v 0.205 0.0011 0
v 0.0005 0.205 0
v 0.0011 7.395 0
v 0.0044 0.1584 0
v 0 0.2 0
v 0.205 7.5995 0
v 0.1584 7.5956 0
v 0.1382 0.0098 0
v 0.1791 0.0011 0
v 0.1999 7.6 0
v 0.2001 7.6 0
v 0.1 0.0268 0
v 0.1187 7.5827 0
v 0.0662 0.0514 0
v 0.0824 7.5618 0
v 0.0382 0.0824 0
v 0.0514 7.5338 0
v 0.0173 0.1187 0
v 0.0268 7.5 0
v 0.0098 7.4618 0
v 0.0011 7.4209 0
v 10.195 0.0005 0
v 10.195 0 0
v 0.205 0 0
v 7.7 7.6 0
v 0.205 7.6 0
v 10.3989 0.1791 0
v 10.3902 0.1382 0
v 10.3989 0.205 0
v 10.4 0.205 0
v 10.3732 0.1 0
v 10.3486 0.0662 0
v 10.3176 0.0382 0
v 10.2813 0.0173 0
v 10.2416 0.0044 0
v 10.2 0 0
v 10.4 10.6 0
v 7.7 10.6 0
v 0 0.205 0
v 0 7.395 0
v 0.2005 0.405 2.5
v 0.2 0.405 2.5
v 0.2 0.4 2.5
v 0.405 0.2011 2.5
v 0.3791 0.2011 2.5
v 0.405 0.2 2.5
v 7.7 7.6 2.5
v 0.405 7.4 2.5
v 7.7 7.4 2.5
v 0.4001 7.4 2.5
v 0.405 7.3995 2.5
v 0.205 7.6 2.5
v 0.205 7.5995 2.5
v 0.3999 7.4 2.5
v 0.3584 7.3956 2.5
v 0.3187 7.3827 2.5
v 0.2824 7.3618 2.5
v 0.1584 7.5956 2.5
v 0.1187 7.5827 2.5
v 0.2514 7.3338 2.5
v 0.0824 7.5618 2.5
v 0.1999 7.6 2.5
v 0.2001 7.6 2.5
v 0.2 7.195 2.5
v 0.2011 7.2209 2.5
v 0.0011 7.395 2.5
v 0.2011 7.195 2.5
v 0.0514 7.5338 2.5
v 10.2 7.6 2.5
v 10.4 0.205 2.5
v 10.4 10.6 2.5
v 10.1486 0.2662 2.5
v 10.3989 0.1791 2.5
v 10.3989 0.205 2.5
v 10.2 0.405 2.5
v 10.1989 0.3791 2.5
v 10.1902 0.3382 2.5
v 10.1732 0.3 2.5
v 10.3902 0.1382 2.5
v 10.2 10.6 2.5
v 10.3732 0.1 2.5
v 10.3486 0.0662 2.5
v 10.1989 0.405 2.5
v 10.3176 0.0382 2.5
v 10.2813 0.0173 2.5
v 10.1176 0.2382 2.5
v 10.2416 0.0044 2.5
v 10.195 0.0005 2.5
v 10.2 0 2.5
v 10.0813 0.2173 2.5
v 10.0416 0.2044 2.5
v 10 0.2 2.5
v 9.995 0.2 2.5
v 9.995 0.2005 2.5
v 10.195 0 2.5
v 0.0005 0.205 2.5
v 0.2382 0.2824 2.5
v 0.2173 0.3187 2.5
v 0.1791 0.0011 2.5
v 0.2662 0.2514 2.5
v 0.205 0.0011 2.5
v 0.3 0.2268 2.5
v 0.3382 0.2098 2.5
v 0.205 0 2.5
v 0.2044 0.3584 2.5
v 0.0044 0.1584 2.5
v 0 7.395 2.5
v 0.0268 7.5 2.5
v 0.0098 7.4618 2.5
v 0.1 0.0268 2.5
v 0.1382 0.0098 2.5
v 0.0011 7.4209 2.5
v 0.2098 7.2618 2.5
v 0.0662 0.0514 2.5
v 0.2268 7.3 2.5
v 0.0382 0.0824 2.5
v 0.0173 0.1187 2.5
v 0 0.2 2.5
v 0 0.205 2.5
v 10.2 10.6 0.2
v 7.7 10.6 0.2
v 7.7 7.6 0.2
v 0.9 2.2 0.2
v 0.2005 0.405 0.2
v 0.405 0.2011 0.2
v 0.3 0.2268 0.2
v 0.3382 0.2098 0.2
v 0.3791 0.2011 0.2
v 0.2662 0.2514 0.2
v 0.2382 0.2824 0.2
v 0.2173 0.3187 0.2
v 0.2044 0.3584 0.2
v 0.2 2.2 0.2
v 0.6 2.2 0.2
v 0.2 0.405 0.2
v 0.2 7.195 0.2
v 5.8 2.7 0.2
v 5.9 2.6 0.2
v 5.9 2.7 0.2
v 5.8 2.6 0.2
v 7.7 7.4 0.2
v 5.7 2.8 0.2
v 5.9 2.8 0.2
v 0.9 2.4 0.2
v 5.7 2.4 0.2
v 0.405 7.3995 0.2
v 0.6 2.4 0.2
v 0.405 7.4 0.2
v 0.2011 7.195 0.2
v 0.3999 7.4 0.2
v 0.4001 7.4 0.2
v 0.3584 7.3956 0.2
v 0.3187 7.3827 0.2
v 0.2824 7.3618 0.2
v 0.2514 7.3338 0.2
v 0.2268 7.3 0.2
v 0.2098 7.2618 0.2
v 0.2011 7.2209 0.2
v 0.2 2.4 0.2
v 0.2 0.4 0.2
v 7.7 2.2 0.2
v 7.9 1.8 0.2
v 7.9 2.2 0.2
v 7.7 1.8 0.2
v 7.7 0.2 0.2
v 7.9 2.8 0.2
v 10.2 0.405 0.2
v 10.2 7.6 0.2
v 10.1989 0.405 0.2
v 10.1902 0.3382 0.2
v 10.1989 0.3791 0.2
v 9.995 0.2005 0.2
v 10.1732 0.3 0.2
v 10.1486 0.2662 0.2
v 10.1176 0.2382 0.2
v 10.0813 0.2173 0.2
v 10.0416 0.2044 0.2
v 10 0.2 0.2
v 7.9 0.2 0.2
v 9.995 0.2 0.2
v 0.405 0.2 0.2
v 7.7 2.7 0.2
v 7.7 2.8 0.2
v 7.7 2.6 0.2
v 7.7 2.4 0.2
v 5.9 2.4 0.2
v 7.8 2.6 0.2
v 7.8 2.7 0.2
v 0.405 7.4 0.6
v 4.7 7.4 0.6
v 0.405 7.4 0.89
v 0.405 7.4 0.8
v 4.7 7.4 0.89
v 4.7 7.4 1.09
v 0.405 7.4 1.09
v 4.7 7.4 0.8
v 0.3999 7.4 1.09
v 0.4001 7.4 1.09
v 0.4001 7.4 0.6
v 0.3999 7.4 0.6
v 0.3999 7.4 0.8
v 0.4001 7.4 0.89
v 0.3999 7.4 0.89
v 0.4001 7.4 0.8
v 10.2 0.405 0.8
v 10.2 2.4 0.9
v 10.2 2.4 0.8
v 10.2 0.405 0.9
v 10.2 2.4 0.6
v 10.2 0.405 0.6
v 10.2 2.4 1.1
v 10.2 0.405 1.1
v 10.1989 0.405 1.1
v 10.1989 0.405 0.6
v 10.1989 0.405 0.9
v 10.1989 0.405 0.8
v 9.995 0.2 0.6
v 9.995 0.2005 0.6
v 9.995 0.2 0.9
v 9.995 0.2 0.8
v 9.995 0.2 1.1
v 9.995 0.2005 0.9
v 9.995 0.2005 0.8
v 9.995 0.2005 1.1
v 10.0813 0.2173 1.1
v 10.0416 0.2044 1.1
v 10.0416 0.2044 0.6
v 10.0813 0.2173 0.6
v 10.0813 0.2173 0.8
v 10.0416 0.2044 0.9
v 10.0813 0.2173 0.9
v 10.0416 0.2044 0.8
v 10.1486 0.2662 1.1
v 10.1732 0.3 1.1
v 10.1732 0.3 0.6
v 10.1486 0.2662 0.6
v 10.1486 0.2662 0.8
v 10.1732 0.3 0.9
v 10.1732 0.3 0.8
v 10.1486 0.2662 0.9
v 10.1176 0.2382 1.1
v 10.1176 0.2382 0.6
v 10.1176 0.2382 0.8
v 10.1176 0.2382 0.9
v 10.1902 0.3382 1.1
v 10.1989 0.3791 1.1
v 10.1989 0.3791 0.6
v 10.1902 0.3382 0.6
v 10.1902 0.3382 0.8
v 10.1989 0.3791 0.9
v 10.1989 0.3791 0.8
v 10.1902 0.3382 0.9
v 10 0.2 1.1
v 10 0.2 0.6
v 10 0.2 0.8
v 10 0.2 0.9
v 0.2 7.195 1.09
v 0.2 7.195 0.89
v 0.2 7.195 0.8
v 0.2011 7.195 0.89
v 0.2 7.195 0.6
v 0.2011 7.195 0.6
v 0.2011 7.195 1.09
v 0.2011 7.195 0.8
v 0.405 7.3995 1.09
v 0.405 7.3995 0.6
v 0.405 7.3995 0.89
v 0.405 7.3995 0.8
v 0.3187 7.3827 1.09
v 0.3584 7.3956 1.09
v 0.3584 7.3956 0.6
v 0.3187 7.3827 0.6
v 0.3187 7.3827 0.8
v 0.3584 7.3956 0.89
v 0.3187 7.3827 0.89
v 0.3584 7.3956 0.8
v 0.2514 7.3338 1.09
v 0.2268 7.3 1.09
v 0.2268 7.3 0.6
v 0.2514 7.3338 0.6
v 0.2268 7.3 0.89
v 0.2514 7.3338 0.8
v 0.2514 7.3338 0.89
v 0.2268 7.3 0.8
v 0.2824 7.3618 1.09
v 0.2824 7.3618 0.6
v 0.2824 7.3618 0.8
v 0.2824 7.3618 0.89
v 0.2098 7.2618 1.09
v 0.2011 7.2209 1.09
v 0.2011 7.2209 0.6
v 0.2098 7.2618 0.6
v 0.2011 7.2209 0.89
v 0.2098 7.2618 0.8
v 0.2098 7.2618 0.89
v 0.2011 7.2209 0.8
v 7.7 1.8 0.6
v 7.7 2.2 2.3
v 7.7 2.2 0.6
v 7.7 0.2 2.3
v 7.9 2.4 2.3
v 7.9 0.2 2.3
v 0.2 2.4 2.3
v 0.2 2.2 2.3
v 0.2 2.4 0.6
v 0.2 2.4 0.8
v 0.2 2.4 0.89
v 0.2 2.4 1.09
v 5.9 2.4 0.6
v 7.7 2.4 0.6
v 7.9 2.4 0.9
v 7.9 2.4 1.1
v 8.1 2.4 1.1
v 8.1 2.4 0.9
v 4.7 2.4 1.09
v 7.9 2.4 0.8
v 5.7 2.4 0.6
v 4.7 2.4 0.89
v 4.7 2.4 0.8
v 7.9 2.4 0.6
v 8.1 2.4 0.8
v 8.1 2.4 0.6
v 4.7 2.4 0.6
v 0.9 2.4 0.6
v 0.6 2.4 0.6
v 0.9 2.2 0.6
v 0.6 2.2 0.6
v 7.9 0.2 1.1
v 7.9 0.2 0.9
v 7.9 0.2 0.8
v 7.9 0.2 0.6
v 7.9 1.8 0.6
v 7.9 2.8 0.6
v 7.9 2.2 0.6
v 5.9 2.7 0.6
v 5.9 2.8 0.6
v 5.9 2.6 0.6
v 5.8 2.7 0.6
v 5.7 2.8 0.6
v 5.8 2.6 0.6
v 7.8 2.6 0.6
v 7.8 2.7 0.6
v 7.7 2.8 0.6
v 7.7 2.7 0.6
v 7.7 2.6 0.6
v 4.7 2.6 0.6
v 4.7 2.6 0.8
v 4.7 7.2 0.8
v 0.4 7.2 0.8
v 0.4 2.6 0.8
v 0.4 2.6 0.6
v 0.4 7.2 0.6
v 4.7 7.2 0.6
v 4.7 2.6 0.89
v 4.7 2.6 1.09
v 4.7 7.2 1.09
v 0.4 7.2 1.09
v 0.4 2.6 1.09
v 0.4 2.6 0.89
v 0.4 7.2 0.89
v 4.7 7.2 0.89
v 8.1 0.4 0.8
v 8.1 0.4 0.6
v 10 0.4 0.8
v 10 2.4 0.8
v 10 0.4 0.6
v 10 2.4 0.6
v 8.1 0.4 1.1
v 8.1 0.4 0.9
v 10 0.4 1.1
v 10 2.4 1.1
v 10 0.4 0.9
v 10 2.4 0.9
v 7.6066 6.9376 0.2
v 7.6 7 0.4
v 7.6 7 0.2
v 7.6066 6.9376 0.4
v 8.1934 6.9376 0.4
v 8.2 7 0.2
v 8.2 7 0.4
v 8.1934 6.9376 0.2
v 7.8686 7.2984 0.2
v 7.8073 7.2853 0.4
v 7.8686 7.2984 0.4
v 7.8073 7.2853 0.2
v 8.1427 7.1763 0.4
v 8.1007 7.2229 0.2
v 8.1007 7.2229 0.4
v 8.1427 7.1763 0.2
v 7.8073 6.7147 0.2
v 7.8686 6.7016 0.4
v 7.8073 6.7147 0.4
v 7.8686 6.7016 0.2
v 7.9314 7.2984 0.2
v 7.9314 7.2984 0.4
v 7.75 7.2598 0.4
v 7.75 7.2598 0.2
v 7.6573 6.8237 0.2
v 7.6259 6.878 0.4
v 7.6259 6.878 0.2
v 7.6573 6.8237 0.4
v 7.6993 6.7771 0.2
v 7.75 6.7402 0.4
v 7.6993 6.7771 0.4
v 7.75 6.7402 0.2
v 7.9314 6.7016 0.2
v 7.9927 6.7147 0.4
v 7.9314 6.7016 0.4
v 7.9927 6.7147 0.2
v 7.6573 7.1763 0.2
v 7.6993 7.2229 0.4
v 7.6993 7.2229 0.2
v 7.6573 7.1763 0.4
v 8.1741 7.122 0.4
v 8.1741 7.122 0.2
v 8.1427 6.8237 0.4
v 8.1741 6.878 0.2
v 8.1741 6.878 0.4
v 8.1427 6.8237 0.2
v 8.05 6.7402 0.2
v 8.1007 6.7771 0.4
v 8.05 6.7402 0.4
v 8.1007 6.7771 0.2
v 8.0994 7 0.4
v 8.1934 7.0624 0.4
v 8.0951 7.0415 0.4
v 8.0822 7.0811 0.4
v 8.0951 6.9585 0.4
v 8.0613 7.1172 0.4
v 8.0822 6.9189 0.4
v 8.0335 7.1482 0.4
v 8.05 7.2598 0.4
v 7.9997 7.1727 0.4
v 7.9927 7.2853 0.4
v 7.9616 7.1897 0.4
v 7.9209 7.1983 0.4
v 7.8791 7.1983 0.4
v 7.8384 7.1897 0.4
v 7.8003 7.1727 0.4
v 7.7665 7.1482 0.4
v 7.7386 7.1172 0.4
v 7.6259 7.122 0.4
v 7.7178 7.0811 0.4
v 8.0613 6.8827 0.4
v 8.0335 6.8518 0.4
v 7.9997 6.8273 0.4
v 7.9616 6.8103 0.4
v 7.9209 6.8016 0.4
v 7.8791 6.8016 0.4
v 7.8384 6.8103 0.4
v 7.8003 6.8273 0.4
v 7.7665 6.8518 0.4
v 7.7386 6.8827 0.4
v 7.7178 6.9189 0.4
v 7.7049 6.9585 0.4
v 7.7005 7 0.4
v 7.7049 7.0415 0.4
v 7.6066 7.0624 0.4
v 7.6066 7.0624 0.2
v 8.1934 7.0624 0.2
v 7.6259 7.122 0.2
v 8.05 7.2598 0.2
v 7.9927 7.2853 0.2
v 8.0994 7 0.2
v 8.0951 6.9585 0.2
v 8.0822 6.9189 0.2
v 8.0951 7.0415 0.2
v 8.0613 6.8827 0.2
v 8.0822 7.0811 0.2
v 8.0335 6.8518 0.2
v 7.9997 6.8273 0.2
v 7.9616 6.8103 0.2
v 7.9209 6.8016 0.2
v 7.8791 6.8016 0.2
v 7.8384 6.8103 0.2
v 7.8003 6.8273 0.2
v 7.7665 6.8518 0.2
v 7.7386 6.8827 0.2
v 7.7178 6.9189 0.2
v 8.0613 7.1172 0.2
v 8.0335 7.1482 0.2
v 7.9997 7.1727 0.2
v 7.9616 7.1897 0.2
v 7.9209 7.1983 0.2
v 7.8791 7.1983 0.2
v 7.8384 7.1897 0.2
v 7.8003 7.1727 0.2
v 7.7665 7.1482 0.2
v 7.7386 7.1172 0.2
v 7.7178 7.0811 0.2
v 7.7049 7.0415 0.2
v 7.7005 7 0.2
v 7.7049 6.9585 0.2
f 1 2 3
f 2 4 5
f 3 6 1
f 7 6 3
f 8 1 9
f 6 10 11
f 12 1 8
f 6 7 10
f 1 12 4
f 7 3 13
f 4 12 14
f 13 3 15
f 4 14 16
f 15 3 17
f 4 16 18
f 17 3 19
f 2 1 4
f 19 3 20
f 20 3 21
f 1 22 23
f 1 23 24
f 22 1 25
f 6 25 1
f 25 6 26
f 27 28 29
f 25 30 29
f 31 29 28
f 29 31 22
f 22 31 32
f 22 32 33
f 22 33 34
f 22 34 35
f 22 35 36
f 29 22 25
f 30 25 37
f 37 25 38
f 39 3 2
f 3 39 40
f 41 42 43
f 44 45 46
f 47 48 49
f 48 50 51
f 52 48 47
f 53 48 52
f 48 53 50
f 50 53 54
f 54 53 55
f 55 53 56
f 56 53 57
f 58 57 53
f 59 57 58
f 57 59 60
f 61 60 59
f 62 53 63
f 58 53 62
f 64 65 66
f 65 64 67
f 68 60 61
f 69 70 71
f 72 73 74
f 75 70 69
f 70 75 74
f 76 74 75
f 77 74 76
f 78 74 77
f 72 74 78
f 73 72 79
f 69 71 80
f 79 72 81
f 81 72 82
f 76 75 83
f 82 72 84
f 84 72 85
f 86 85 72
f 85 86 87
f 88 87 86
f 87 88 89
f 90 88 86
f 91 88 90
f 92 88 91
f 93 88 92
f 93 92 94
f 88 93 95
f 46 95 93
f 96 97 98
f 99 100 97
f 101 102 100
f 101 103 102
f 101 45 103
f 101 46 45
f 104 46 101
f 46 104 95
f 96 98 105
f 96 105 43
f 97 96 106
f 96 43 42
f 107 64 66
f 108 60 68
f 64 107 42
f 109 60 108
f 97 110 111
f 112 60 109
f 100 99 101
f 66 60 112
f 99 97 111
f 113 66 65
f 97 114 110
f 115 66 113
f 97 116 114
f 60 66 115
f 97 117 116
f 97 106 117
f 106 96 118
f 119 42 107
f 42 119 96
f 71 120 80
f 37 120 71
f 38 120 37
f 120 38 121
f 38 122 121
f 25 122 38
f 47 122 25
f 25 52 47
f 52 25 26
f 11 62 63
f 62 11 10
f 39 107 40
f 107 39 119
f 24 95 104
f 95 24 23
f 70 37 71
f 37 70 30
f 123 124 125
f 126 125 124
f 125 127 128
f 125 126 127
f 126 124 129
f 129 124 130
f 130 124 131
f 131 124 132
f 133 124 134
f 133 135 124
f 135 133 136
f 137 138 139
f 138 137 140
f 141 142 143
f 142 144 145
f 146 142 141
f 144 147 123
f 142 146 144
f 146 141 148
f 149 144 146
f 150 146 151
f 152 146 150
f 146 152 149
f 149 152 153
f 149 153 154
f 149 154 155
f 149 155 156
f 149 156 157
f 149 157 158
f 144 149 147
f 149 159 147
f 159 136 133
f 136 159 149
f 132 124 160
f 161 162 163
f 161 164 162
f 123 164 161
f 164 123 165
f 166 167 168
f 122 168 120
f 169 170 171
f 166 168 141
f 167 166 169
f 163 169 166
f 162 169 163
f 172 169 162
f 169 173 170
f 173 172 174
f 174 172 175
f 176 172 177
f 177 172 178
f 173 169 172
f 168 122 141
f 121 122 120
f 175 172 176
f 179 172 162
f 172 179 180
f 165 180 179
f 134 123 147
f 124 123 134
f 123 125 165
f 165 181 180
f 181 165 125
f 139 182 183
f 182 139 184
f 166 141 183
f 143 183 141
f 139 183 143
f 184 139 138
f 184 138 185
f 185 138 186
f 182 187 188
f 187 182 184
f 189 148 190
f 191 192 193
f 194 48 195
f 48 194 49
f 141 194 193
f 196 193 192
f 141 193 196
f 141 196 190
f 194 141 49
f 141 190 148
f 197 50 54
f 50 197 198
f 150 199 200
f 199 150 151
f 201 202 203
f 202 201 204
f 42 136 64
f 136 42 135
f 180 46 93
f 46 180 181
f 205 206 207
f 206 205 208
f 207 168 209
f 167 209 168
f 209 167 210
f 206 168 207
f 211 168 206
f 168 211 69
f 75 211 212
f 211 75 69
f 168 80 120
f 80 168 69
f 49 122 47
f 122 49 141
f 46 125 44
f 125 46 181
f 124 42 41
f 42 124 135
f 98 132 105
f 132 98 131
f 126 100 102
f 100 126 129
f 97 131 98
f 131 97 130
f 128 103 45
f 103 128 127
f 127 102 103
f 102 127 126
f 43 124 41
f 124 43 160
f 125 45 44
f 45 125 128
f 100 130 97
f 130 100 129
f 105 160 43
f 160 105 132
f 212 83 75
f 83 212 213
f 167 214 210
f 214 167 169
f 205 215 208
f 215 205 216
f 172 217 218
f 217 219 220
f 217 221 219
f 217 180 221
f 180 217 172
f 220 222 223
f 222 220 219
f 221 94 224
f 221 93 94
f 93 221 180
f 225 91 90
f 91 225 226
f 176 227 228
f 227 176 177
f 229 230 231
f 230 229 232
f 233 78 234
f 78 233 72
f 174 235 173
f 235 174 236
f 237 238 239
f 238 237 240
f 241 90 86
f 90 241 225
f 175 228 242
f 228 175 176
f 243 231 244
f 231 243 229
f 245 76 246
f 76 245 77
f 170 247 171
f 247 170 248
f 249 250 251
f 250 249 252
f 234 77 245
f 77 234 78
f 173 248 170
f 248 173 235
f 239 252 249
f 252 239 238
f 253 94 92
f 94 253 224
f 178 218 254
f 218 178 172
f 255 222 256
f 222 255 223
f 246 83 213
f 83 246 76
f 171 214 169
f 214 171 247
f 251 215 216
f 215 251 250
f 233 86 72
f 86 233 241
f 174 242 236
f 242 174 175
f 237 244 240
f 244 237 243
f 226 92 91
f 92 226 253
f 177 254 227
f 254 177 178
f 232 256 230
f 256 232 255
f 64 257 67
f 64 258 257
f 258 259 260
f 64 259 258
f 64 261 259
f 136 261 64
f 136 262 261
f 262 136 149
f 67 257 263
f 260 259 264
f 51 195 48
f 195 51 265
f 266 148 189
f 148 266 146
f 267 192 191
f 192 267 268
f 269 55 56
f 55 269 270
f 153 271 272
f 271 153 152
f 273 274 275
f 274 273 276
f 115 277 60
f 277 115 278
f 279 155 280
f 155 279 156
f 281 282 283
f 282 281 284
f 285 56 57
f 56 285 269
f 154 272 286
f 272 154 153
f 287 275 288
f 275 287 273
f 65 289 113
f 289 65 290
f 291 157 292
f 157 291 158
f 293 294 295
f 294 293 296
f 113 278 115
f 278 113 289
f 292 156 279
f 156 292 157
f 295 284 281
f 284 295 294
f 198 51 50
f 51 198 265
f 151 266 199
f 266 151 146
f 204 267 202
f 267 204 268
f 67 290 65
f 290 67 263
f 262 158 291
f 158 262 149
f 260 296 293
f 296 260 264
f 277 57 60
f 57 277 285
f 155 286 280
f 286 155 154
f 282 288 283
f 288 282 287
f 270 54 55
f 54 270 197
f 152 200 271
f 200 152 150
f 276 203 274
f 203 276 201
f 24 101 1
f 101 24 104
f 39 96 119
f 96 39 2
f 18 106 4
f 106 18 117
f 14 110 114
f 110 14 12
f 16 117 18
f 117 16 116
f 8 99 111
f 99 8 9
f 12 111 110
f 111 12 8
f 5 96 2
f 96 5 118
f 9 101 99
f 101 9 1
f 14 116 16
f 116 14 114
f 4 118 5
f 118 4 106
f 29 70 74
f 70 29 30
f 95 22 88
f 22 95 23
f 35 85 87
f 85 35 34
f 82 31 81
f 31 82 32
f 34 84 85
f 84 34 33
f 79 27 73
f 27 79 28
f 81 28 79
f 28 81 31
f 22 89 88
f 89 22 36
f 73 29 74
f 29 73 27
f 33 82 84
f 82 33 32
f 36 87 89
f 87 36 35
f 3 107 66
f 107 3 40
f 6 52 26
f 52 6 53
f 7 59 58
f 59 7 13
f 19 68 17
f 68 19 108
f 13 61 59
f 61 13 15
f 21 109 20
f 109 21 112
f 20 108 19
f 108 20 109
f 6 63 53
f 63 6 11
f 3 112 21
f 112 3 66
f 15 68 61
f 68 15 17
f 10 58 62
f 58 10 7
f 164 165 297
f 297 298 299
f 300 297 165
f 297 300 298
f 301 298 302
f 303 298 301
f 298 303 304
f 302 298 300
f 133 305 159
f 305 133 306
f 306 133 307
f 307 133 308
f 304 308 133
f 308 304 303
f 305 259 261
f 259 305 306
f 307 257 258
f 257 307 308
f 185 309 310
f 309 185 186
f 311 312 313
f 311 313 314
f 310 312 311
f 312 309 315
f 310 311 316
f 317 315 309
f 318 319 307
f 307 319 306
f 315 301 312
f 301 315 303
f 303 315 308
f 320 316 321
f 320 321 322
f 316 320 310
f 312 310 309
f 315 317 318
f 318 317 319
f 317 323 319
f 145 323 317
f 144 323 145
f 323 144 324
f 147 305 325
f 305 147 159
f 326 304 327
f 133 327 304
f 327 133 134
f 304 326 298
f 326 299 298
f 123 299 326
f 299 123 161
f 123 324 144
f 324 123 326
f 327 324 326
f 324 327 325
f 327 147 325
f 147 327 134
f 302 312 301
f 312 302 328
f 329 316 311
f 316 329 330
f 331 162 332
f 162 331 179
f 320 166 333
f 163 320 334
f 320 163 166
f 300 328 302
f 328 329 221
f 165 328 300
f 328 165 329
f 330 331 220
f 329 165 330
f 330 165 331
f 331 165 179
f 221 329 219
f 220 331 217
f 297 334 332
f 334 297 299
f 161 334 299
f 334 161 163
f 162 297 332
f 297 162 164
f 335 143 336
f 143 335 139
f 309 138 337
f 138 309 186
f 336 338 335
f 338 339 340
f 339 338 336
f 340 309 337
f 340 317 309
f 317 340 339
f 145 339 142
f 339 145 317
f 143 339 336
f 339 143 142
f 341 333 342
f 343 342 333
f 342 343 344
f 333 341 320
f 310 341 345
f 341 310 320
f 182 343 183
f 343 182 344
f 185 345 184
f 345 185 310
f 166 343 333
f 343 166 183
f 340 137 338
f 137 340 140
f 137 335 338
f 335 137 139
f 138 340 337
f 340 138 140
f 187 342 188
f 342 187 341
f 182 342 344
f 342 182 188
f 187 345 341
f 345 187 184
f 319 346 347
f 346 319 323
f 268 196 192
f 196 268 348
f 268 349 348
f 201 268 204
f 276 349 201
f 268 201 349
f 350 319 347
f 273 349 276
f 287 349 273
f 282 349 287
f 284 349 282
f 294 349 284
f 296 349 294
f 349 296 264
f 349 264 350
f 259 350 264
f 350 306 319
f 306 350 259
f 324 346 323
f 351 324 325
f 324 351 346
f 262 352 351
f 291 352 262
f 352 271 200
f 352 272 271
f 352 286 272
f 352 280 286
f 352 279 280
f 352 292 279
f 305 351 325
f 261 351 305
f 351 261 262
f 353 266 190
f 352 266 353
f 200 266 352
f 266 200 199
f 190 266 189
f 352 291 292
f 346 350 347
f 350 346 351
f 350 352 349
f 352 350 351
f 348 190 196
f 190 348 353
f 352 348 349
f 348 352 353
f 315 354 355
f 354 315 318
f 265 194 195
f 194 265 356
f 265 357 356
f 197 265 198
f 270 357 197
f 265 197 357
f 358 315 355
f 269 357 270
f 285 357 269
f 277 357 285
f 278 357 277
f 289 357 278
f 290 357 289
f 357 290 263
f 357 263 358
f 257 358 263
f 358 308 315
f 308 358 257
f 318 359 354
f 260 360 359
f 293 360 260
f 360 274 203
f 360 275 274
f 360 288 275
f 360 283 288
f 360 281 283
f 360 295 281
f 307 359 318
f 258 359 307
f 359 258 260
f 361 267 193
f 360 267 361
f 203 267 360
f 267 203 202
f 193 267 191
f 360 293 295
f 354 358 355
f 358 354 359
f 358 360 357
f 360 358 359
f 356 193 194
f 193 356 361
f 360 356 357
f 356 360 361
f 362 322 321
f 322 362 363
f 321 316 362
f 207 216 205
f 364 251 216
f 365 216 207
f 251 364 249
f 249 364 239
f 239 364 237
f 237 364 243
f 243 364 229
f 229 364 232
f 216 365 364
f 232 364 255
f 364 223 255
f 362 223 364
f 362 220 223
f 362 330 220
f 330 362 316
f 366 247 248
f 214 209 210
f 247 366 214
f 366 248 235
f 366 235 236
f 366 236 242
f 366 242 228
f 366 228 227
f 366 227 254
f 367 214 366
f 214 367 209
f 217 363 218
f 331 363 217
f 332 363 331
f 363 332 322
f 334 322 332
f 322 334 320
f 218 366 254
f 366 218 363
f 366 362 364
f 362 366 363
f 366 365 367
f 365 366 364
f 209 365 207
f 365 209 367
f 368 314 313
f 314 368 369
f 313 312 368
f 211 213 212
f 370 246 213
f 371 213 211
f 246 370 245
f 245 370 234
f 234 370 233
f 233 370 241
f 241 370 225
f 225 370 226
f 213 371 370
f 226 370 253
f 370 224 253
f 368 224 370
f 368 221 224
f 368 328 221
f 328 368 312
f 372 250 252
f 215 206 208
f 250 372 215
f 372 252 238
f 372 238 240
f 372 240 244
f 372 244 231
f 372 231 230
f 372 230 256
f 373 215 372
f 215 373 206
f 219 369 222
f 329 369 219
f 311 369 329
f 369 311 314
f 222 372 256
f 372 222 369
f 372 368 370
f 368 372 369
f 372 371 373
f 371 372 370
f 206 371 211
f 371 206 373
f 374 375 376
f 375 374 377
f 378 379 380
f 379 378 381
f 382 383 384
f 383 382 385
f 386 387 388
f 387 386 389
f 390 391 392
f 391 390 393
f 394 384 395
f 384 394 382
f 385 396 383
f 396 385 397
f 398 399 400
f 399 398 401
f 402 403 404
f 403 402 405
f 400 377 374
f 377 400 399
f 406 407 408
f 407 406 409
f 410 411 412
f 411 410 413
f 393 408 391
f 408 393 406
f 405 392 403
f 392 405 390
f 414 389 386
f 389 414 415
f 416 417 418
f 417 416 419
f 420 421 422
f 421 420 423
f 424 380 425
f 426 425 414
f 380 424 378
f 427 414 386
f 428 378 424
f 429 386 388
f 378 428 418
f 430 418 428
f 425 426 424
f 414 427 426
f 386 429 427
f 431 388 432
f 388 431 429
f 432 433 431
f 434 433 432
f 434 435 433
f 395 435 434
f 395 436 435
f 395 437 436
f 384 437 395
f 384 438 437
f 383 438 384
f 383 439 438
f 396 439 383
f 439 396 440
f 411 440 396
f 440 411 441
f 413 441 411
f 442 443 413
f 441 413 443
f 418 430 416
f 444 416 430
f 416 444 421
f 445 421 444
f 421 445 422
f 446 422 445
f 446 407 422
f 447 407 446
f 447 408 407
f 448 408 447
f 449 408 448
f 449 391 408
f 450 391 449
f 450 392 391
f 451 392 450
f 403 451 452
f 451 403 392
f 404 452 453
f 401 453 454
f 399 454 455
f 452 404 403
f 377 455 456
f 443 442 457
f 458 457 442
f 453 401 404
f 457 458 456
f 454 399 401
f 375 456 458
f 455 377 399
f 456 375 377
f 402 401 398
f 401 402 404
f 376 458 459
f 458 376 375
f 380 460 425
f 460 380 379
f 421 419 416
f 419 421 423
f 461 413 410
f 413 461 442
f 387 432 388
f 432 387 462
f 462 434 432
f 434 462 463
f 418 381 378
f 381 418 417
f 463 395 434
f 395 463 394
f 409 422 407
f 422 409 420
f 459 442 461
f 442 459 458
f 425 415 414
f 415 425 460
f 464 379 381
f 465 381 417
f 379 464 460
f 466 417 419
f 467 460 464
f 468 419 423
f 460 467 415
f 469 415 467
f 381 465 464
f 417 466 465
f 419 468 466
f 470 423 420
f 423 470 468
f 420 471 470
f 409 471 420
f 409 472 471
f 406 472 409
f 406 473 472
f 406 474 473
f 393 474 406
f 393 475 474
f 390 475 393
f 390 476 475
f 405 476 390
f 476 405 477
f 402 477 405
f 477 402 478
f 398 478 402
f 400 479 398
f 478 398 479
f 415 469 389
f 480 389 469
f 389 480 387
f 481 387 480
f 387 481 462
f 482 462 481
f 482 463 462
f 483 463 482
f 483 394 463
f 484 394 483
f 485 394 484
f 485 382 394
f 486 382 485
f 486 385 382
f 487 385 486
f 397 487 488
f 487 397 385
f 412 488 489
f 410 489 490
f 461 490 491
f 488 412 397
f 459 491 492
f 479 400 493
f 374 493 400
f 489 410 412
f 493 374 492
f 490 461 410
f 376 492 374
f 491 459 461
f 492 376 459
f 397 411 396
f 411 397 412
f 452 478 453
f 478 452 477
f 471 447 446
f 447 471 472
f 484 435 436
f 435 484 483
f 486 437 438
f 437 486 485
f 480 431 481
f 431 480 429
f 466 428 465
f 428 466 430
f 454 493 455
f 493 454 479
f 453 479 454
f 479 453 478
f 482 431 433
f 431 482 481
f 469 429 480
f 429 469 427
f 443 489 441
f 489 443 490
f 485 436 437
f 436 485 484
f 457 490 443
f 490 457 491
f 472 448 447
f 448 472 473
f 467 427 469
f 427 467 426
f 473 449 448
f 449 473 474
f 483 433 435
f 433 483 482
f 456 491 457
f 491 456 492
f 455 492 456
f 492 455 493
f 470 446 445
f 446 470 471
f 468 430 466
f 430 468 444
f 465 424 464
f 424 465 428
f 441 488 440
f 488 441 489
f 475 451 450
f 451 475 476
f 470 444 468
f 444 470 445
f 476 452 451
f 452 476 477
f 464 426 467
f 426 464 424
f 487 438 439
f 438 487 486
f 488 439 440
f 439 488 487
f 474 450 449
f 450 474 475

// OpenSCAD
$fn = 30;
differenceOffset = 0.01;
resinThickness = 0.2;
casingDepth = 3;
backWallCasingDepth = 2.5;
frontWallCasingDepth = casingDepth - backWallCasingDepth;
lockHeigth = 0.2;
railsForCircuitHeigth = 0.4;
railWidth = 0.2;

doubleSidedTapeThickness = 0.1;
module handle(width, depth, heigth, thickness){
    difference(){
        cube([width, depth + thickness, heigth]);
        translate([-differenceOffset / 2, -differenceOffset, - differenceOffset])cube([width + differenceOffset, depth + differenceOffset, heigth - thickness + differenceOffset]);
        }
        screwMountToDoor = 1;
    translate([0, 0, heigth - screwMountToDoor]){
        cube([width, thickness, screwMountToDoor]);
        }
    }

module slider (width, depth, heigth, thickness, sliderExceedanceWidth){
    sliderTabWidth = 3.1;
    sliderTabHeigth = 1.8;
    translate([(sin(360 * $t) * sliderExceedanceWidth/2 ) - sliderExceedanceWidth/2, 0, 0])
    union(){
    translate([0, depth - thickness, 0]){
        cube([width + sliderExceedanceWidth, thickness, heigth]);
        }
    translate([width - sliderTabWidth - sliderExceedanceWidth/2, depth - thickness, -sliderTabHeigth]){
        cube([sliderTabWidth, thickness, sliderTabHeigth]);
        }
    }
    }   
    
module lock(width, depth, heigth, thickness){
    
    sliderThickness = 0.3;
    sliderExceedanceWidth = 1.9;
    sliderHeigth = 2.5;
    
    handle(width, depth, heigth, thickness);
    
    color("cyan")slider(width, depth,sliderHeigth, sliderThickness, sliderExceedanceWidth);
    }
    
module casingBase(){ 
        polygon([
        [0,0],
        [10 + (resinThickness * 2), 0],
        [10 + (resinThickness * 2), 10.2 + (resinThickness * 2)],
        [7.5 + (resinThickness), 10.2 + (resinThickness * 2)],
        [7.5 + (resinThickness), 7 + (resinThickness * 3)],
        [0, 7 + (resinThickness * 3)]
        ]);
        }
module backWallCasing(depth){
    module notRoundedShape (){
        difference(){
            linear_extrude(depth){
                casingBase();
                }
            translate([0, 0, resinThickness]){
                linear_extrude(depth){
                    offset(-resinThickness){
                    casingBase();
                        }   
                    }
                }
            translate([0, 7 + (resinThickness * 3), resinThickness]){
                cube([10.2, 3 + resinThickness + differenceOffset, depth]);
                }
            translate([7.5 + (resinThickness), 7 + (resinThickness * 2), resinThickness]){
                cube([resinThickness + differenceOffset, resinThickness + differenceOffset, depth]);
                }
            }
        }
    module innerRoundedShape (){
        union(){
        notRoundedShape();
        translate([resinThickness, resinThickness, 0])fillet(resinThickness, depth);
        translate([10.2, resinThickness, 0])rotate([0, 0, 90])fillet(resinThickness, depth);
        translate([resinThickness, 7 + (resinThickness * 2), 0])rotate([0, 0, 270])fillet(resinThickness, depth);
            }
        }
     module fullyRoundedShaped (){
        difference(){
        innerRoundedShape();
        translate([0, 0, - differenceOffset/2])fillet(resinThickness, depth + differenceOffset);
        translate([10.4, 0, - differenceOffset/2])rotate([0, 0, 90])fillet(resinThickness, depth + differenceOffset);
        translate([0, 7 + (resinThickness * 3), - differenceOffset/2])rotate([0, 0, 270])fillet(resinThickness, depth + differenceOffset);
            }
        }
     module addBatteryHolder (){
         union(){
             fullyRoundedShaped();
             difference(){
                 translate([resinThickness, 2 + resinThickness, resinThickness]){
                    cube([7.5, resinThickness, depth - (resinThickness * 2)]);
                    }
                 translate([resinThickness + 0.4, 2 + resinThickness, resinThickness]){
                    cube([0.3, resinThickness, railsForCircuitHeigth]);
                    }
                 }
             difference(){
                translate([7.5 + resinThickness, resinThickness, resinThickness]){
                    cube([resinThickness, 2 + resinThickness, depth - (resinThickness * 2)]);
                    }
                translate([7.5 + resinThickness, 2 + resinThickness - 0.4, resinThickness]){
                    cube([resinThickness, 0.4, railsForCircuitHeigth]);
                    }
                }
             
             
             railsForProtectionCircuit();
             }
         }
     module addRailsForCircuitBoard(){
         union(){
             addBatteryHolder();
             lowerRailForBoard();
             upperRailForBoard();
             lowerRailForScreen();
             upperRailForScreen();
             }
         }
     module lowerRailForBoard(){
         union(){
            translate([resinThickness, 2 + (resinThickness * 2), resinThickness + railsForCircuitHeigth]){
                cube([4.5, railWidth, resinThickness]);
                }
            translate([resinThickness, 2 + (resinThickness * 2), resinThickness + railsForCircuitHeigth]){
                cube([railWidth, 5, resinThickness]);
                }
            translate([resinThickness, 7 + (resinThickness * 2) - railWidth, resinThickness + railsForCircuitHeigth]){
                cube([4.5, railWidth, resinThickness]);
                }
            }            
        }
    module upperRailForBoard(){
        boardThickness = 0.09;
        translate([0, 0, railWidth + boardThickness]){
            lowerRailForBoard();
            }
        }
    module lowerRailForScreen(){
         union(){
            translate([7.5 + (resinThickness * 2), resinThickness, resinThickness + railsForCircuitHeigth]){
                cube([resinThickness, 2 + resinThickness, resinThickness]);
                }
            translate([7.5 + (resinThickness * 2), resinThickness, resinThickness + railsForCircuitHeigth]){
                cube([10 - 7.5 - resinThickness, resinThickness, resinThickness]);
                }
            translate([10, resinThickness, resinThickness + railsForCircuitHeigth]){
                cube([resinThickness, 2 + resinThickness, resinThickness]);
                }
            }            
        }
    module upperRailForScreen(){
        boardThickness = 0.1;
        translate([0, 0, railWidth + boardThickness]){
            lowerRailForScreen();
            }
        }
    module addPivotPoint(){
        pivotDiameter = 0.2;
        union(){
            addRailsForCircuitBoard();
            translate([0,0,resinThickness])difference(){
                linear_extrude(0.2){
                    translate([7.5 + (pivotDiameter * 2), 7 + (resinThickness * 2) - 0.4])circle(0.3);
                    }
                linear_extrude(0.2 + differenceOffset){
                    offset(-0.1){
                    translate([7.5 + (pivotDiameter * 2), 7 + (resinThickness * 2) - 0.4])circle(0.3);
                        }
                    }
                }
            }
        }
    module railsForProtectionCircuit(){
         railWidth = 0.2;
         protectionBoardWidth = 1.8;
         protectionBoardHeigth = 0.4;
         slothWidth = 0.1;
        difference(){
            union(){
                translate([resinThickness + 7.5 - protectionBoardWidth - railWidth, 2 + (resinThickness * 2), resinThickness]){
                    cube([railWidth, railWidth * 2, protectionBoardHeigth]);
                    }
                translate([resinThickness + 7.5, 2 + (resinThickness * 2), resinThickness]){
                    cube([railWidth, railWidth * 2, protectionBoardHeigth]);
                    }
                }
            union(){
                translate([resinThickness + 7.5 - protectionBoardWidth - railWidth + slothWidth, 2 + (resinThickness * 3), resinThickness]){
                    cube([slothWidth, slothWidth, protectionBoardHeigth + railWidth]);
                    }
                translate([resinThickness + 7.5, 2 + (resinThickness * 3), resinThickness]){
                    cube([slothWidth, slothWidth, protectionBoardHeigth + railWidth]);
                    }
                }
            }        
        }
        addPivotPoint();
}
 
module fillet(r, h) {
    translate([r / 2, r / 2, h/2])

        difference() {
            cube([r + 0.01, r + 0.01, h], center = true);

            translate([r/2, r/2, 0])
                cylinder(r = r, h = h + 1, center = true);

        }
}

module frontWallCasing(){
    module notRoundedShape(){
        union(){
            translate([0,0,0.2])
            difference(){
                linear_extrude(frontWallCasingDepth){
                    casingBase();
                    }
                translate([0,0,-differenceOffset])
                linear_extrude(frontWallCasingDepth - resinThickness + differenceOffset){
                    offset(- resinThickness){
                        casingBase();
                        }
                    }
                }
            difference(){
                linear_extrude(frontWallCasingDepth + 0.2){
                    offset(- resinThickness){
                        casingBase();
                        }
                    }
                translate([0,0,-differenceOffset])
                linear_extrude(frontWallCasingDepth + 0.2 + differenceOffset){
                    offset(- resinThickness - 0.2){
                        casingBase();
                        }
                    }
                }
            }
        }
    module innerRoundedShape(){
        union(){
            notRoundedShape();
            
            translate([resinThickness * 2, resinThickness * 2,0])
            fillet(resinThickness, frontWallCasingDepth + lockHeigth);
            translate([10, resinThickness * 2,0])rotate([0, 0, 90])
            fillet(resinThickness, frontWallCasingDepth + lockHeigth);
            translate([10, 10 + resinThickness,0])rotate([0, 0, 180])
            fillet(resinThickness, frontWallCasingDepth + lockHeigth);
                    
            }
        }
        innerRoundedShape();
    
    }
//lock(7.5, 2.2, 3.8, 0.2);


//color("white")translate([-resinThickness, doubleSidedTapeThickness, 10 + (resinThickness * 3) + 0.8 + doubleSidedTapeThickness])rotate([-90, 0, 0])
    backWallCasing(backWallCasingDepth);

//color("white")translate([-resinThickness, doubleSidedTapeThickness + 10, 10 + (resinThickness * 3) + 0.8 + doubleSidedTapeThickness])rotate([-90, 0, 0])frontWallCasing();
    
    
    
    
    
    
    
    
    
